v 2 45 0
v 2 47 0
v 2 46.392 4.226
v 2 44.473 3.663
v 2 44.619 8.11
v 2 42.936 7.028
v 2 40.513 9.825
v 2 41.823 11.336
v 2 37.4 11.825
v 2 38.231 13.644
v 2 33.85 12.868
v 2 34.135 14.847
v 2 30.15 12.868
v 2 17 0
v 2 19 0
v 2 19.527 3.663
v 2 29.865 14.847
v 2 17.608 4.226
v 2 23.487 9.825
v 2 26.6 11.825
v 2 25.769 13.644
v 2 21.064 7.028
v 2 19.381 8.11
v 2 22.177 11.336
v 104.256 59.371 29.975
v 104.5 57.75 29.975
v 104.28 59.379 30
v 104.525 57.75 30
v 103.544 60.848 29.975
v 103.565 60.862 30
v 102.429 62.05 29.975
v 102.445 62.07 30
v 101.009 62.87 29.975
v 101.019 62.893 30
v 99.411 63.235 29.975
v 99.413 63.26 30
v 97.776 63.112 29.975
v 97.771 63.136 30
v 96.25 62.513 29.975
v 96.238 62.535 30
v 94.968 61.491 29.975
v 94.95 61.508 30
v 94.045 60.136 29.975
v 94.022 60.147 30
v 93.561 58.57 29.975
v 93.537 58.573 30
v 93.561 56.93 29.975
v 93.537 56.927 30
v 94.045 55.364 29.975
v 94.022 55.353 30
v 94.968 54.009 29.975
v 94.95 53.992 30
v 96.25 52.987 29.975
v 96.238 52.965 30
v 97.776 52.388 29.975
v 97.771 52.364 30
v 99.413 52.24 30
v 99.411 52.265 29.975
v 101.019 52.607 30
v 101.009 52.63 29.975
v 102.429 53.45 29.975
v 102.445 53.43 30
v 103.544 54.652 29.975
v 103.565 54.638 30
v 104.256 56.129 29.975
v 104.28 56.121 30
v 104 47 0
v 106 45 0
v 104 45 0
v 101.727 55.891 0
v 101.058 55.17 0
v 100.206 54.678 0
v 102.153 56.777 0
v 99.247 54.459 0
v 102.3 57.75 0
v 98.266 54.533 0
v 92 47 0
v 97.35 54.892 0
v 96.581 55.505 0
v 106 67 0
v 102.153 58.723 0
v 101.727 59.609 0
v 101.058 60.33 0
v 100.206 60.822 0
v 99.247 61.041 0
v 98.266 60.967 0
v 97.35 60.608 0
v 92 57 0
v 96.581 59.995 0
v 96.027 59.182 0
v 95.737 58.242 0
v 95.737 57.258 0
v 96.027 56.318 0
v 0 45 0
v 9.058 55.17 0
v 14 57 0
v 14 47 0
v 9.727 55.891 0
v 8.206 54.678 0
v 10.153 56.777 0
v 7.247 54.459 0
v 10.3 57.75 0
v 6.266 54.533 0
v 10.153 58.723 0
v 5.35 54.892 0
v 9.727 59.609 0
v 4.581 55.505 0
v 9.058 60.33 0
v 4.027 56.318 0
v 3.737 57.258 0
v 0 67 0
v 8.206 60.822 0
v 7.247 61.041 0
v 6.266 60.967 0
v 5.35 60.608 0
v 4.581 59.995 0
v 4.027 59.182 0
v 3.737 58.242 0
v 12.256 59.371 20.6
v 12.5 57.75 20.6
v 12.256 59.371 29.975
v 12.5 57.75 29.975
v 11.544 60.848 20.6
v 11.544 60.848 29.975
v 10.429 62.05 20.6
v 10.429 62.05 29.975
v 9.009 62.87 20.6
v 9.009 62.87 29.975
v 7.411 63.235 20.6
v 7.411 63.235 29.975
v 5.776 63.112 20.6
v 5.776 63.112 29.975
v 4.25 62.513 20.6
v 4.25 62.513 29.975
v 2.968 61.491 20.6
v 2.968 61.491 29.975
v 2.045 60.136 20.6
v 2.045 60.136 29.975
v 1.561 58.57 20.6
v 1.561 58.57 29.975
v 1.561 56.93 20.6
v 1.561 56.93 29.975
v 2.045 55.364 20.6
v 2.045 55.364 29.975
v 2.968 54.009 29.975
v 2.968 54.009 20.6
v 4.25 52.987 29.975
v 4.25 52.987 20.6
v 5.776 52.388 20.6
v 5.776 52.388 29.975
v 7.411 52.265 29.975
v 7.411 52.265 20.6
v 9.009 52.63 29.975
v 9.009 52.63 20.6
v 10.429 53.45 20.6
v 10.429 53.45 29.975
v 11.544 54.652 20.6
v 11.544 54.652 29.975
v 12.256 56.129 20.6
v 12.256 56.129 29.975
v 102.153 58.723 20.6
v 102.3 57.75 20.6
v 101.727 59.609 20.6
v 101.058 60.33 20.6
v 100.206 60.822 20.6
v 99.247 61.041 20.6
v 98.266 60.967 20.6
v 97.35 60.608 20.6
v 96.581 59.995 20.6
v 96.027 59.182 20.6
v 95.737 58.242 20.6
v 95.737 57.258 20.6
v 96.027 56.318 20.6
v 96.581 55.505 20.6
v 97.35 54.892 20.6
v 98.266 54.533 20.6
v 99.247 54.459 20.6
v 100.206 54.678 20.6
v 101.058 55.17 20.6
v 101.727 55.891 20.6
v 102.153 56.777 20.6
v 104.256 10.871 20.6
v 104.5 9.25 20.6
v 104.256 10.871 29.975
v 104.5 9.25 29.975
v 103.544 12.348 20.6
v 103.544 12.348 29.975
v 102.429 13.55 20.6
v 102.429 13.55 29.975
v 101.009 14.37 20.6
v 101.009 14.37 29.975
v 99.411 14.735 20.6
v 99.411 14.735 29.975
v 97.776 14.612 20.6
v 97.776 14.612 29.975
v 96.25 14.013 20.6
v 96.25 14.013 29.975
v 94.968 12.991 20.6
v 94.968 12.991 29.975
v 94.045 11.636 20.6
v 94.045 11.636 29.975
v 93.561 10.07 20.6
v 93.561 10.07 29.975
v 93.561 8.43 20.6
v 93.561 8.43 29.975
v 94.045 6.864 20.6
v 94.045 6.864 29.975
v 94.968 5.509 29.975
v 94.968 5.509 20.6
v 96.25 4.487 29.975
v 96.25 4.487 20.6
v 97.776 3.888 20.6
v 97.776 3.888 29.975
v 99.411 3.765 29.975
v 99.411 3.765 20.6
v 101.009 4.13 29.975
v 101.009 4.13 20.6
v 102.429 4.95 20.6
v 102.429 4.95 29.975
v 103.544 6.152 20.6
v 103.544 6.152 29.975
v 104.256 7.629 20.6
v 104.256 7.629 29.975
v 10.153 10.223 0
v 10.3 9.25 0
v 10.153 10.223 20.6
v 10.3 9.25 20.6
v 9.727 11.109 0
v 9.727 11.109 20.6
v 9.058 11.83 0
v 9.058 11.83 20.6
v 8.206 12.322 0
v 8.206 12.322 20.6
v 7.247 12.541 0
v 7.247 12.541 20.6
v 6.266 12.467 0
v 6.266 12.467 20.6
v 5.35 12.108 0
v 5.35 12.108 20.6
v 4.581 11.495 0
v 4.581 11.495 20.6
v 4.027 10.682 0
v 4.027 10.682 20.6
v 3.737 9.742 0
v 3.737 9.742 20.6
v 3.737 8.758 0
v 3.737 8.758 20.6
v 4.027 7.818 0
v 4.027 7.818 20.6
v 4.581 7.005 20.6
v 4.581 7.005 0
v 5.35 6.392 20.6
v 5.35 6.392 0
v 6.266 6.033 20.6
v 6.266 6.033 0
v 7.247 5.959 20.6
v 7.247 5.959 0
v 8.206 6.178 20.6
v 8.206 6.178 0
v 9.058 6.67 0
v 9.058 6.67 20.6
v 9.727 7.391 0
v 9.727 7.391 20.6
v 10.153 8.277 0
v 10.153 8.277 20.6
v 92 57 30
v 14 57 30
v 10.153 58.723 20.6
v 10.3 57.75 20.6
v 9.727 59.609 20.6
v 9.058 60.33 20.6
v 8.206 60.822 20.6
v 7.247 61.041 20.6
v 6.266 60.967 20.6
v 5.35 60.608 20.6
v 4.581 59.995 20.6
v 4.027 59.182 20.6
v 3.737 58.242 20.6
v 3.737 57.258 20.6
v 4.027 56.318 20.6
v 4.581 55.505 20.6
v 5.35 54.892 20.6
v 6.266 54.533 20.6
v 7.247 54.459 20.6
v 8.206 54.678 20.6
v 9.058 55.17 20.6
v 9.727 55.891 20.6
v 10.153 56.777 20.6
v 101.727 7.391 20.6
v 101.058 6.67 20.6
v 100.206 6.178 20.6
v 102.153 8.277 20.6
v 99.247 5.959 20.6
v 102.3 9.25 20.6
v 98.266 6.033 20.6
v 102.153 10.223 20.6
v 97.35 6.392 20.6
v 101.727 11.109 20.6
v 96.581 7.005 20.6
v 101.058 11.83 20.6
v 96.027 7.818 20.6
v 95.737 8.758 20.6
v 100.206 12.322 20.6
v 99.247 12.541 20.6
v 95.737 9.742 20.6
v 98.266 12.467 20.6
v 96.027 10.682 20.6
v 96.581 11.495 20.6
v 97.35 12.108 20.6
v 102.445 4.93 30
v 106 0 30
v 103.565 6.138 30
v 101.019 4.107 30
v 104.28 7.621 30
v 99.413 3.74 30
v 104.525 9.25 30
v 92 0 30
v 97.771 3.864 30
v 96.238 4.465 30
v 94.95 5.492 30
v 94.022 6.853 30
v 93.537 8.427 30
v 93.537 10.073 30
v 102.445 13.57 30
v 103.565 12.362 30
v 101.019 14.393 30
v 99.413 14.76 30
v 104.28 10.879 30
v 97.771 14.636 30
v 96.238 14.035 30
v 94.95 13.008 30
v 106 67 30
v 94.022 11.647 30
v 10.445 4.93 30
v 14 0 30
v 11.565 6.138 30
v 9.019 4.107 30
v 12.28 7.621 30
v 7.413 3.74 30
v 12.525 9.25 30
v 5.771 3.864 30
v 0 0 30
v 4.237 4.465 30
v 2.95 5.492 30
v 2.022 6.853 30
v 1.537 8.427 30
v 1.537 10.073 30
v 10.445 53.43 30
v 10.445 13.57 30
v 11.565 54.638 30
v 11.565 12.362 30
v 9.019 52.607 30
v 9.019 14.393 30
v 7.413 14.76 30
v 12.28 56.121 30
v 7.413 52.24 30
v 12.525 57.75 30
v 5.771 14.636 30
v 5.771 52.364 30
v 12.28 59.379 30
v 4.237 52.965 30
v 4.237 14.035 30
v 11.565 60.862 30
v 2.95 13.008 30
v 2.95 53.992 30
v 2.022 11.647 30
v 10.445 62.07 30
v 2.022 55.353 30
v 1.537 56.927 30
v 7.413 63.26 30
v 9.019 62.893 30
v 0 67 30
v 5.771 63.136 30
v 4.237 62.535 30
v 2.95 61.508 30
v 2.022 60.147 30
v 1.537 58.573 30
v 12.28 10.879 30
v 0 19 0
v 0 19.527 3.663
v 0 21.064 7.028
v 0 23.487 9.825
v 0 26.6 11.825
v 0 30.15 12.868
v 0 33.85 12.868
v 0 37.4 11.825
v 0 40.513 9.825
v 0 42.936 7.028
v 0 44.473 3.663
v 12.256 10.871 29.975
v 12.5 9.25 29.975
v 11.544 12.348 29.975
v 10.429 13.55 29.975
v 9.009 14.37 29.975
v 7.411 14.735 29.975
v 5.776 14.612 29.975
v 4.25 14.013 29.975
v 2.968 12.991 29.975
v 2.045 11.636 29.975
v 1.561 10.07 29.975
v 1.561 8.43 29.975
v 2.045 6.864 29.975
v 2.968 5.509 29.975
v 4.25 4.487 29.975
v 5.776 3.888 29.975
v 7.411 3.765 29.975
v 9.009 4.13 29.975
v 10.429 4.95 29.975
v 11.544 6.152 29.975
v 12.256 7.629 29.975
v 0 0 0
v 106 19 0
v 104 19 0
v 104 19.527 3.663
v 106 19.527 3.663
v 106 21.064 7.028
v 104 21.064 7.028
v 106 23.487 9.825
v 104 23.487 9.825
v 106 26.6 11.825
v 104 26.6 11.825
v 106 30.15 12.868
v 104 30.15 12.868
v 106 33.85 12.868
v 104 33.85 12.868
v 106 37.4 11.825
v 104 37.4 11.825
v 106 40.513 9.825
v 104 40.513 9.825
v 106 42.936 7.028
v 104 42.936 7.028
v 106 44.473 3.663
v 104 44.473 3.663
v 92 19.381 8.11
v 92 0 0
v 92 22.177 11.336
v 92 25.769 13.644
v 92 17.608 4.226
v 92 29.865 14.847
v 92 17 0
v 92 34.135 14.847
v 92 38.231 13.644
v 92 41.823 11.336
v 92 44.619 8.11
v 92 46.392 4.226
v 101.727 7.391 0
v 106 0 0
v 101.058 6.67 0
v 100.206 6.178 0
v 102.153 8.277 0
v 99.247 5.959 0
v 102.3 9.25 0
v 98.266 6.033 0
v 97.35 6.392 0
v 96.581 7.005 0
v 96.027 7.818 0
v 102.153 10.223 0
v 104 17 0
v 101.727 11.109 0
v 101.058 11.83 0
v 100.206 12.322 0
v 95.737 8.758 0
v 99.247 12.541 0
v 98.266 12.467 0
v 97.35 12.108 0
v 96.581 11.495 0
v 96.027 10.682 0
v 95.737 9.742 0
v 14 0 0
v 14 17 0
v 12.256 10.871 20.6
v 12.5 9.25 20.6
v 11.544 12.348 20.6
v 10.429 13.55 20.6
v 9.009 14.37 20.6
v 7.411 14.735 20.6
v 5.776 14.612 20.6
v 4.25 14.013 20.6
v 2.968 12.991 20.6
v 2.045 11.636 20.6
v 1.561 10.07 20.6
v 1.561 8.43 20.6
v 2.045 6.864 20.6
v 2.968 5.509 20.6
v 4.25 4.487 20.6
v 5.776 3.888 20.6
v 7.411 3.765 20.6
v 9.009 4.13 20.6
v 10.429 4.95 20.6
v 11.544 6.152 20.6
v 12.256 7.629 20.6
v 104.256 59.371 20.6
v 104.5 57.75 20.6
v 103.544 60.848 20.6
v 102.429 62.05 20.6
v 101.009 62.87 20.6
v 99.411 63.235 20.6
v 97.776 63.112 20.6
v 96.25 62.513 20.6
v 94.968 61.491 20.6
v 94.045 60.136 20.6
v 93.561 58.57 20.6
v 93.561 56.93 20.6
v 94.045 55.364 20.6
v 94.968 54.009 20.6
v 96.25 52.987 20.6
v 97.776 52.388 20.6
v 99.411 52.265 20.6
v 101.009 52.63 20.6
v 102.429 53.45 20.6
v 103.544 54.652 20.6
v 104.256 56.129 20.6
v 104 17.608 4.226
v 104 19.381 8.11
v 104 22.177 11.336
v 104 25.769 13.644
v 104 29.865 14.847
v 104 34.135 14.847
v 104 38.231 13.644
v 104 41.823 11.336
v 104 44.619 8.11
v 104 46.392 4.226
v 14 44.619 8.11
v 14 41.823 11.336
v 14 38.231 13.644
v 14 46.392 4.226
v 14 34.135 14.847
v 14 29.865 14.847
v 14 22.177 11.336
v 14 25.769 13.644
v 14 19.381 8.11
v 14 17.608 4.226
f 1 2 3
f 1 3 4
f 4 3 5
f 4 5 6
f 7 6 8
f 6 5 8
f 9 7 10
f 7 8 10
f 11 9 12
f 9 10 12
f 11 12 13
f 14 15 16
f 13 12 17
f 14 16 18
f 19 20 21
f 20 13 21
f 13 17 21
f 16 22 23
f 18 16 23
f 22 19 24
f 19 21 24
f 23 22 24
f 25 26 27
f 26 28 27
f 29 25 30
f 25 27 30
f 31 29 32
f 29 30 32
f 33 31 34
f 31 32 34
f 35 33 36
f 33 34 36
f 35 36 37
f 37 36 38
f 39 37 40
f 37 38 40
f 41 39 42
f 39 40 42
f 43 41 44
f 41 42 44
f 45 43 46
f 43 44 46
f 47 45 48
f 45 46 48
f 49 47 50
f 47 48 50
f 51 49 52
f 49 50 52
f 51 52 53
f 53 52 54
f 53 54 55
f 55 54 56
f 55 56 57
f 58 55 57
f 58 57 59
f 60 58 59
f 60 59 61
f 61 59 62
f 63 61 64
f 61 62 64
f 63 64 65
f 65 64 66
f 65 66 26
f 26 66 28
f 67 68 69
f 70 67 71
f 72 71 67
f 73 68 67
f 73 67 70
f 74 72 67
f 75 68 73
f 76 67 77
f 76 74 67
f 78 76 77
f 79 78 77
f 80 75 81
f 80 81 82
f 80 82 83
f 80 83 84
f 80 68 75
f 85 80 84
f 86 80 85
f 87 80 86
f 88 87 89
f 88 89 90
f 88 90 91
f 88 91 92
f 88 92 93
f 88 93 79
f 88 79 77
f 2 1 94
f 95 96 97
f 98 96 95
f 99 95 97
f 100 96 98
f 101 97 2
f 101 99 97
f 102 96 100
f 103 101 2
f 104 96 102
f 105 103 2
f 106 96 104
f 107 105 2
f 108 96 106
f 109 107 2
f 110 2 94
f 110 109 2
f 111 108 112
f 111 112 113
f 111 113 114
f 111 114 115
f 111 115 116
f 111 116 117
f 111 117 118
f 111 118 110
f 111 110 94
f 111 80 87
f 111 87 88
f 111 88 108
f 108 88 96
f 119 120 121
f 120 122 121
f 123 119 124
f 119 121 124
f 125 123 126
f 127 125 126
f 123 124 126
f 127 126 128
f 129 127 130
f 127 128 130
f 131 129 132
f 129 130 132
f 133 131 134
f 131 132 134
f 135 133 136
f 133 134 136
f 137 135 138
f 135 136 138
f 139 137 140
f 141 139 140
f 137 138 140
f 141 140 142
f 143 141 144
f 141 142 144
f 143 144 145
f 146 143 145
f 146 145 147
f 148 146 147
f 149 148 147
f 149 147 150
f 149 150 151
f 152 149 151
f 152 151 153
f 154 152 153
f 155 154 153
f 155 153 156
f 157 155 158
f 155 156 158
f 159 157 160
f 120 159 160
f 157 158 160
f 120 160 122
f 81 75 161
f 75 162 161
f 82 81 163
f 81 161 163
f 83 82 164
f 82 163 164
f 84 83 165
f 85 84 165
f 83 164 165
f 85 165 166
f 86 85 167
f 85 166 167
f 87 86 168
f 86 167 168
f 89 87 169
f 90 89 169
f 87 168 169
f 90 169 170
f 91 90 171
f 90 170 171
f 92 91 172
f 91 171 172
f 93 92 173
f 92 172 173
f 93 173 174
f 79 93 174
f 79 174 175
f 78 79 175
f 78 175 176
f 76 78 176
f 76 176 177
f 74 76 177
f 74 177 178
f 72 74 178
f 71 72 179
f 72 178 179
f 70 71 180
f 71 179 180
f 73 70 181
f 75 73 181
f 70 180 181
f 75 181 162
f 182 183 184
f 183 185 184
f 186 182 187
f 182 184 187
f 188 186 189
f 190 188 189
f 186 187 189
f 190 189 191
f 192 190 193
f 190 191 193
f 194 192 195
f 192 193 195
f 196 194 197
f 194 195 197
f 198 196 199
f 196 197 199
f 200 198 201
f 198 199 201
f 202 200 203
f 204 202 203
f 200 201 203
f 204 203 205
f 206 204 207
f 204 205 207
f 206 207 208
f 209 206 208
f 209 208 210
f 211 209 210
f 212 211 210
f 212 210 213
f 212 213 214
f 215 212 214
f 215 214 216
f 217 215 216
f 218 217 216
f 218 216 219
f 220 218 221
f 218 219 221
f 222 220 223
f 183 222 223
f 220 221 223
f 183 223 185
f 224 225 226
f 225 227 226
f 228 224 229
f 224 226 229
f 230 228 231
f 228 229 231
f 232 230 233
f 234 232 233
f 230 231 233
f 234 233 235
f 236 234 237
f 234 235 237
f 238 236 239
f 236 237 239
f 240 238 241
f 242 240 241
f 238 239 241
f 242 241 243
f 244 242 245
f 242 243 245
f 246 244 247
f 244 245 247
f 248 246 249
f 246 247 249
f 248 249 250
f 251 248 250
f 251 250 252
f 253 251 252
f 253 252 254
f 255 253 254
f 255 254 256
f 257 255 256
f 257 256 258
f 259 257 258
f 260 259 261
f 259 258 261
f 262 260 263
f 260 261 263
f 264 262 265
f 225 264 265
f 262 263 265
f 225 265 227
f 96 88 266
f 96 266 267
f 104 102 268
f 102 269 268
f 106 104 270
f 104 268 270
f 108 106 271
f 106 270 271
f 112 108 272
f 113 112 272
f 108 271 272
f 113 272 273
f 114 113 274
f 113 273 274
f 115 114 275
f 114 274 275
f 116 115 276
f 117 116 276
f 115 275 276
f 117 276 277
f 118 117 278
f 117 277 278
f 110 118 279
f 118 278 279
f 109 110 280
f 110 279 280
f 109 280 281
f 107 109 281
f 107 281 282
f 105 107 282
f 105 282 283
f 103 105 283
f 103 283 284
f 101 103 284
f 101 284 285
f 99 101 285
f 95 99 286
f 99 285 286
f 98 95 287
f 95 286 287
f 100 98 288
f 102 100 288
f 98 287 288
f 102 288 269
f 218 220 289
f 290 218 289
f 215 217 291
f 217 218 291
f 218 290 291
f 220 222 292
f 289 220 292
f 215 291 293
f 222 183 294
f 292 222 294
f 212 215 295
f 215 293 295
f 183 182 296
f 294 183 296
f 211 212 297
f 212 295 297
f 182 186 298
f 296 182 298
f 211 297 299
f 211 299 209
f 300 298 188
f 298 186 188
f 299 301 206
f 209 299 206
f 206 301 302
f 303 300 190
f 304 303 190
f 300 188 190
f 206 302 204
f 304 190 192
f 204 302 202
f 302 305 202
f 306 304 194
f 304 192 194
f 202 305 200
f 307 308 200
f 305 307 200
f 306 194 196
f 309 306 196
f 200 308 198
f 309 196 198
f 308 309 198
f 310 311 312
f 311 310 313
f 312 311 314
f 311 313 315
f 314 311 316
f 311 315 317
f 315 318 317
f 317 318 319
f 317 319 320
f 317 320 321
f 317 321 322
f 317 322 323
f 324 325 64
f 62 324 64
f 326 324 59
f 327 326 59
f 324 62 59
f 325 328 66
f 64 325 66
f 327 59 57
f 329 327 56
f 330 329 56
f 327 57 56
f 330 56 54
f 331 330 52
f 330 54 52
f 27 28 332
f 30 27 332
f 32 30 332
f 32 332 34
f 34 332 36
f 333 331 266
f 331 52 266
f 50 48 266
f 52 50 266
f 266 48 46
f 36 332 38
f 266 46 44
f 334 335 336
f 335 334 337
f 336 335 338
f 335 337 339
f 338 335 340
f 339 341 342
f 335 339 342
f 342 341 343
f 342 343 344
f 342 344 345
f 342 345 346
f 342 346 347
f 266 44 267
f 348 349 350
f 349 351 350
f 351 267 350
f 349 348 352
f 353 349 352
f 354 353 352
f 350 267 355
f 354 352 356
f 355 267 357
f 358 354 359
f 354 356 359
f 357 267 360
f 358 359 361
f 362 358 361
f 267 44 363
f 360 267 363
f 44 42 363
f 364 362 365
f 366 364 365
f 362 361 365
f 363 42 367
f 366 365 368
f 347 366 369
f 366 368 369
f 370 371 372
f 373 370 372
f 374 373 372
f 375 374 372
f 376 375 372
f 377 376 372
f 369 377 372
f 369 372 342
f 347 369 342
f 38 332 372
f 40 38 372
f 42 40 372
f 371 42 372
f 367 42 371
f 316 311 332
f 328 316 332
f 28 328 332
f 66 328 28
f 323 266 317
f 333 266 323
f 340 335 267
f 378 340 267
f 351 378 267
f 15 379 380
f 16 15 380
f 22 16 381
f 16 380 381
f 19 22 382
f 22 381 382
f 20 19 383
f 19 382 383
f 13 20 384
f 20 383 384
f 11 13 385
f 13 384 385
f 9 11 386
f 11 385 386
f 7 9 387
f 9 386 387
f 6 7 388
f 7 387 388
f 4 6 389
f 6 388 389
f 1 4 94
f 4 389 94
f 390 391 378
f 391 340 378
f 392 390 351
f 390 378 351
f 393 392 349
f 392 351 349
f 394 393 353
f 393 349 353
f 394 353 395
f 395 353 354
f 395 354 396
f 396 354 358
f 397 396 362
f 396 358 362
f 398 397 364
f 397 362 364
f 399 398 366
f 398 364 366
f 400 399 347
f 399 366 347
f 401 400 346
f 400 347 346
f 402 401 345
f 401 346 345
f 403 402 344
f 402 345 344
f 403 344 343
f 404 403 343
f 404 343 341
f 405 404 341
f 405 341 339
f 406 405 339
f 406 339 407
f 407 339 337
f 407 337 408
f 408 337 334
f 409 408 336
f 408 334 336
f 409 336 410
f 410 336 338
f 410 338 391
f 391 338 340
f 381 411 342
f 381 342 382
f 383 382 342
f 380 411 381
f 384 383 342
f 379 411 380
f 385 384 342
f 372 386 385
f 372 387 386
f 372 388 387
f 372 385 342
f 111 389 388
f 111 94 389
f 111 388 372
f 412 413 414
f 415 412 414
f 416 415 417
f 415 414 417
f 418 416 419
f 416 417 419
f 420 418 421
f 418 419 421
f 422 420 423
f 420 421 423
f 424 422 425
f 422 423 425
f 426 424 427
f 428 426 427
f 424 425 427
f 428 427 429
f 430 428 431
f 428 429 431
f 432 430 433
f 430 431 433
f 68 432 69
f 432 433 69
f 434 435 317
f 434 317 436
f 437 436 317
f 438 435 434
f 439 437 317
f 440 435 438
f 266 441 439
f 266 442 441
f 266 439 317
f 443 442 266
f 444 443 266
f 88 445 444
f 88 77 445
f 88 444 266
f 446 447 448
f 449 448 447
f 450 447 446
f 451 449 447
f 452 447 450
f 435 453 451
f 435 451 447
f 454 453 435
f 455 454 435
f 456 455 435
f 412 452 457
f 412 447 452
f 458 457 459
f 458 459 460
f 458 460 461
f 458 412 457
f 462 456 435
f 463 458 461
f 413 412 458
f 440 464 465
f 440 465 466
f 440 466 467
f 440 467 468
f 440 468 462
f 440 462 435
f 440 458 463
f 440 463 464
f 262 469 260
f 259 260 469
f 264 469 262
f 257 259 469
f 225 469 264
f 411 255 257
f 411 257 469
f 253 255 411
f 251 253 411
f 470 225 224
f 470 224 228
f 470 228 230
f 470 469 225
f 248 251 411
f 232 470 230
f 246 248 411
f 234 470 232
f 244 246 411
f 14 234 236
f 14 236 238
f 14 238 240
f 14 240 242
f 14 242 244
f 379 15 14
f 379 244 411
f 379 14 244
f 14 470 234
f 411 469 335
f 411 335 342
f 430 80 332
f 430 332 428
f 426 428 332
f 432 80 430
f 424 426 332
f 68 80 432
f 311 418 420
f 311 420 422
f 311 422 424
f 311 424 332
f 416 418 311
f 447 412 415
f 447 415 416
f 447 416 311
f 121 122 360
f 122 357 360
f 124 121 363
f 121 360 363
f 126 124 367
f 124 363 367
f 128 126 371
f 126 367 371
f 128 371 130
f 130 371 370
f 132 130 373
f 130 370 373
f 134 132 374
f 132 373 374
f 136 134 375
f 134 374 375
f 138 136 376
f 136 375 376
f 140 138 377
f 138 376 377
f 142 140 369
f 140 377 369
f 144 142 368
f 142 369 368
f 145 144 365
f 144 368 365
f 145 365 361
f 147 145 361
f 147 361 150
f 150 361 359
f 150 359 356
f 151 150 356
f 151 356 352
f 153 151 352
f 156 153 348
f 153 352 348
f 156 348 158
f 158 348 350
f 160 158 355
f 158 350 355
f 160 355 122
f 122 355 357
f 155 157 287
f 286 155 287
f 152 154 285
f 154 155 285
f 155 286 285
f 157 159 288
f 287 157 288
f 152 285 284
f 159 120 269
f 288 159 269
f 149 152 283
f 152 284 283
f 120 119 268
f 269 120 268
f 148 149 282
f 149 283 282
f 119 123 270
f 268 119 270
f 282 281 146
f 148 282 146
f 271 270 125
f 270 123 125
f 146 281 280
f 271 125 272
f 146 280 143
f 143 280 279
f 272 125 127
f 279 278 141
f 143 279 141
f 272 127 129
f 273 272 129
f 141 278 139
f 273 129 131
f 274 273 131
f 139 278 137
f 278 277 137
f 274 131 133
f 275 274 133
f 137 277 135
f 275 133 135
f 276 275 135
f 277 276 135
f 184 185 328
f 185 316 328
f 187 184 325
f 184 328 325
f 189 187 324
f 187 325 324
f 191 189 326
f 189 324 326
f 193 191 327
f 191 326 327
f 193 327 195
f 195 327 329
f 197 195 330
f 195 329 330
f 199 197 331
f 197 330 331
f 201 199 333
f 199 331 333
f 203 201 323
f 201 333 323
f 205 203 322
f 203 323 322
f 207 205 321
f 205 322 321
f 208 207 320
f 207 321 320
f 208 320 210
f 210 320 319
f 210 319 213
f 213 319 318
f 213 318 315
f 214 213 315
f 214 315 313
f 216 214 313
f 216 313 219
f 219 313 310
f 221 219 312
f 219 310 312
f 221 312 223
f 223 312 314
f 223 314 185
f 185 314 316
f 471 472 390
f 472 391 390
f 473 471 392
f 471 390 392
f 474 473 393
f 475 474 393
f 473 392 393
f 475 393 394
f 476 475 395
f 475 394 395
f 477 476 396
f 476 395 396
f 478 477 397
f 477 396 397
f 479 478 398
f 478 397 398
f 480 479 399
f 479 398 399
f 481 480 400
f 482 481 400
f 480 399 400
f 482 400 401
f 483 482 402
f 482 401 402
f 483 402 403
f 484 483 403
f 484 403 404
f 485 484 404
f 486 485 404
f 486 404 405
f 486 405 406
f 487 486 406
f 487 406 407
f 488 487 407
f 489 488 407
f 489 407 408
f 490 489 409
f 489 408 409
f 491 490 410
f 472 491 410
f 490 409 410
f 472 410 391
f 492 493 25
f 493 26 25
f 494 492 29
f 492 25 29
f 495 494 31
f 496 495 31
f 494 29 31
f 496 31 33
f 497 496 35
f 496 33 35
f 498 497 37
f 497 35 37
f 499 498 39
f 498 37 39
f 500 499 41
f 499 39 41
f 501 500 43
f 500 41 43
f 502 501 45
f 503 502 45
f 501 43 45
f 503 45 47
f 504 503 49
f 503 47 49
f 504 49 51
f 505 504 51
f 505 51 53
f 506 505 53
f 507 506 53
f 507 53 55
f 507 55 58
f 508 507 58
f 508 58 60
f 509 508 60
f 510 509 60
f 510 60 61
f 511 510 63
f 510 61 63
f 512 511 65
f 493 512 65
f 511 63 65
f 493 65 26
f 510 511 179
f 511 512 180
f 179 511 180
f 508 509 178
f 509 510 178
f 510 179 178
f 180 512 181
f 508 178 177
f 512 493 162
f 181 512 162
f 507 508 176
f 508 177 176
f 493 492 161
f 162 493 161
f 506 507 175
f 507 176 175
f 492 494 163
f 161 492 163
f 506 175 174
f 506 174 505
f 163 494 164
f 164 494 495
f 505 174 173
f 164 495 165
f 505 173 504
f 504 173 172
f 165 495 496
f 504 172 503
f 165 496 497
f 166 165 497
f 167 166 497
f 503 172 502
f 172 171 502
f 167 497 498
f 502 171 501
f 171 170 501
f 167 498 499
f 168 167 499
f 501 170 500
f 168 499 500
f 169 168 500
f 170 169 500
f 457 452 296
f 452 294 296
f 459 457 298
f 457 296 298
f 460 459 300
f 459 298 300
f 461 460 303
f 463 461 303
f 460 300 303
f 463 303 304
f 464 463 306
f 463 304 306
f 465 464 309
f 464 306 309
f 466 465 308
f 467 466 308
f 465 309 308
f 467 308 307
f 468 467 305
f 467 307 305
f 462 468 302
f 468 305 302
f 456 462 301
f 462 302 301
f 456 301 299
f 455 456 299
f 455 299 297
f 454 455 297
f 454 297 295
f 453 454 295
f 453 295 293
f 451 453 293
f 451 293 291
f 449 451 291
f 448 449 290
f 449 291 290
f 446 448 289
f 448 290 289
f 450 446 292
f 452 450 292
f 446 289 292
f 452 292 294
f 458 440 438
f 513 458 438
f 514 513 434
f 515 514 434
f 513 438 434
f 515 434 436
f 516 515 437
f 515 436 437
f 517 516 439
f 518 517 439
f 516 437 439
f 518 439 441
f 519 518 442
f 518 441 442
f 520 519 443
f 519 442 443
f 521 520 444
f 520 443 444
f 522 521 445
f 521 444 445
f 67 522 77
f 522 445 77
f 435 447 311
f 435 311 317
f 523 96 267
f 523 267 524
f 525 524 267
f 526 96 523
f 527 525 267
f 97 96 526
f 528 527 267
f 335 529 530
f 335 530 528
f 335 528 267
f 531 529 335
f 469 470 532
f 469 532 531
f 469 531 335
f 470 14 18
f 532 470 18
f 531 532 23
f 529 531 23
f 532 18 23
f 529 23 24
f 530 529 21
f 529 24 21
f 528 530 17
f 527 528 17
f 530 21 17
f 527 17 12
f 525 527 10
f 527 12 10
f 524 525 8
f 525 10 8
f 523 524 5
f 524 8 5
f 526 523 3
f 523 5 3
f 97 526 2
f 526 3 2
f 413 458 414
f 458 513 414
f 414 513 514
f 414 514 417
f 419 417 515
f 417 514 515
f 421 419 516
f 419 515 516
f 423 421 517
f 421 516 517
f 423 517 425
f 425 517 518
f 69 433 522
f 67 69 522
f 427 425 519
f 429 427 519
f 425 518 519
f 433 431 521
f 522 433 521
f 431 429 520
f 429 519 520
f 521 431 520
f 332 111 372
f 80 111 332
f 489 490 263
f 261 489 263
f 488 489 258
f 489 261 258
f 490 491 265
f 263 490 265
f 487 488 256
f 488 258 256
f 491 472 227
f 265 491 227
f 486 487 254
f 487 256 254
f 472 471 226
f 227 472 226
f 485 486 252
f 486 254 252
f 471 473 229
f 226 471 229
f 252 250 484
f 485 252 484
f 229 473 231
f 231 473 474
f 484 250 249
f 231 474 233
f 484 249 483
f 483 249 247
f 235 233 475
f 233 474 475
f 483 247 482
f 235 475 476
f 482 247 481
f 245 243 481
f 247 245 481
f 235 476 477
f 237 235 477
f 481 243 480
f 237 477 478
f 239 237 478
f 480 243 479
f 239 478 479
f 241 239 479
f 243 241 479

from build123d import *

# Parameters (mm, degrees)
P_IDAT_VYSUNUT_M1_DEPTH = 30


# Read off the part's stored shape, not the designer's step: Válcové zahloubení pro M6 šrouby s vnitřním šestihranem1
with BuildPart() as part:
    # Skica1 → Přidat vysunutím1 (new body)
    with BuildSketch(Plane.XY):
        Polygon((0, 0), (0, 67), (106, 67), (106, 0), (92, 0), (92, 57), (14, 57), (14, 0), align=None)
    extrude(amount=P_IDAT_VYSUNUT_M1_DEPTH)

    # Skica2 → Odebrat rotací1 (revolve, cut)
    with BuildSketch(Plane(origin=(0, 0, 0), x_dir=(-1, 0, 0), z_dir=(0, 0, -1))):
        Polygon((-114, 32), (-114, 19), (-104, 19), (-104, 17), (-2, 17), (-2, 19), (8, 19), (8, 32), align=None)
    revolve(axis=Axis((113.408800735, 32, 0), (-1, 0, 0)), mode=Mode.SUBTRACT)

    # V_lcov_ zahlouben_ pro M6 _rouby s v 2 → Válcové zahloubení pro M6 šrouby s vnitřním šestihranem1 (revolve, cut)
    with BuildSketch(Plane(origin=(99, 9.25, 0), x_dir=(1, 0, 0), z_dir=(0, -1, 0))):
        Polygon((0, 0), (3.3, 0), (3.3, 20.6), (5.5, 20.6), (5.5, 29.975), (5.525, 30), (0, 30), align=None)
    revolve(axis=Axis((99, 9.25, 0), (0, 0, 1)), mode=Mode.SUBTRACT)

    # V_lcov_ zahlouben_ pro M6 _rouby s v 3 o → V_lcov_ zahlouben_ pro M6 _rouby s v 3 (revolve, cut)
    with BuildSketch(Plane(origin=(7, 57.75, 0), x_dir=(1, 0, 0), z_dir=(0, -1, 0))):
        Polygon((0, 30), (0, 0), (3.3, 0), (3.3, 20.6), (5.5, 20.6), (5.5, 29.975), (5.525, 30), align=None)
    revolve(axis=Axis((7, 57.75, 0), (0, 0, 1)), mode=Mode.SUBTRACT)

    # V_lcov_ zahlouben_ pro M6 _rouby s v 4 o → V_lcov_ zahlouben_ pro M6 _rouby s v 4 (revolve, cut)
    with BuildSketch(Plane(origin=(99, 57.75, 0), x_dir=(1, 0, 0), z_dir=(0, -1, 0))):
        Polygon((0, 30), (0, 0), (3.3, 0), (3.3, 20.6), (5.5, 20.6), (5.5, 29.975), (5.525, 30), align=None)
    revolve(axis=Axis((99, 57.75, 0), (0, 0, 1)), mode=Mode.SUBTRACT)

    # V_lcov_ zahlouben_ pro M6 _rouby s v 5 o → V_lcov_ zahlouben_ pro M6 _rouby s v 5 (revolve, cut)
    with BuildSketch(Plane(origin=(7, 9.25, 0), x_dir=(1, 0, 0), z_dir=(0, -1, 0))):
        Polygon((0, 30), (0, 0), (3.3, 0), (3.3, 20.6), (5.5, 20.6), (5.5, 29.975), (5.525, 30), align=None)
    revolve(axis=Axis((7, 9.25, 0), (0, 0, 1)), mode=Mode.SUBTRACT)


solid = part.part
